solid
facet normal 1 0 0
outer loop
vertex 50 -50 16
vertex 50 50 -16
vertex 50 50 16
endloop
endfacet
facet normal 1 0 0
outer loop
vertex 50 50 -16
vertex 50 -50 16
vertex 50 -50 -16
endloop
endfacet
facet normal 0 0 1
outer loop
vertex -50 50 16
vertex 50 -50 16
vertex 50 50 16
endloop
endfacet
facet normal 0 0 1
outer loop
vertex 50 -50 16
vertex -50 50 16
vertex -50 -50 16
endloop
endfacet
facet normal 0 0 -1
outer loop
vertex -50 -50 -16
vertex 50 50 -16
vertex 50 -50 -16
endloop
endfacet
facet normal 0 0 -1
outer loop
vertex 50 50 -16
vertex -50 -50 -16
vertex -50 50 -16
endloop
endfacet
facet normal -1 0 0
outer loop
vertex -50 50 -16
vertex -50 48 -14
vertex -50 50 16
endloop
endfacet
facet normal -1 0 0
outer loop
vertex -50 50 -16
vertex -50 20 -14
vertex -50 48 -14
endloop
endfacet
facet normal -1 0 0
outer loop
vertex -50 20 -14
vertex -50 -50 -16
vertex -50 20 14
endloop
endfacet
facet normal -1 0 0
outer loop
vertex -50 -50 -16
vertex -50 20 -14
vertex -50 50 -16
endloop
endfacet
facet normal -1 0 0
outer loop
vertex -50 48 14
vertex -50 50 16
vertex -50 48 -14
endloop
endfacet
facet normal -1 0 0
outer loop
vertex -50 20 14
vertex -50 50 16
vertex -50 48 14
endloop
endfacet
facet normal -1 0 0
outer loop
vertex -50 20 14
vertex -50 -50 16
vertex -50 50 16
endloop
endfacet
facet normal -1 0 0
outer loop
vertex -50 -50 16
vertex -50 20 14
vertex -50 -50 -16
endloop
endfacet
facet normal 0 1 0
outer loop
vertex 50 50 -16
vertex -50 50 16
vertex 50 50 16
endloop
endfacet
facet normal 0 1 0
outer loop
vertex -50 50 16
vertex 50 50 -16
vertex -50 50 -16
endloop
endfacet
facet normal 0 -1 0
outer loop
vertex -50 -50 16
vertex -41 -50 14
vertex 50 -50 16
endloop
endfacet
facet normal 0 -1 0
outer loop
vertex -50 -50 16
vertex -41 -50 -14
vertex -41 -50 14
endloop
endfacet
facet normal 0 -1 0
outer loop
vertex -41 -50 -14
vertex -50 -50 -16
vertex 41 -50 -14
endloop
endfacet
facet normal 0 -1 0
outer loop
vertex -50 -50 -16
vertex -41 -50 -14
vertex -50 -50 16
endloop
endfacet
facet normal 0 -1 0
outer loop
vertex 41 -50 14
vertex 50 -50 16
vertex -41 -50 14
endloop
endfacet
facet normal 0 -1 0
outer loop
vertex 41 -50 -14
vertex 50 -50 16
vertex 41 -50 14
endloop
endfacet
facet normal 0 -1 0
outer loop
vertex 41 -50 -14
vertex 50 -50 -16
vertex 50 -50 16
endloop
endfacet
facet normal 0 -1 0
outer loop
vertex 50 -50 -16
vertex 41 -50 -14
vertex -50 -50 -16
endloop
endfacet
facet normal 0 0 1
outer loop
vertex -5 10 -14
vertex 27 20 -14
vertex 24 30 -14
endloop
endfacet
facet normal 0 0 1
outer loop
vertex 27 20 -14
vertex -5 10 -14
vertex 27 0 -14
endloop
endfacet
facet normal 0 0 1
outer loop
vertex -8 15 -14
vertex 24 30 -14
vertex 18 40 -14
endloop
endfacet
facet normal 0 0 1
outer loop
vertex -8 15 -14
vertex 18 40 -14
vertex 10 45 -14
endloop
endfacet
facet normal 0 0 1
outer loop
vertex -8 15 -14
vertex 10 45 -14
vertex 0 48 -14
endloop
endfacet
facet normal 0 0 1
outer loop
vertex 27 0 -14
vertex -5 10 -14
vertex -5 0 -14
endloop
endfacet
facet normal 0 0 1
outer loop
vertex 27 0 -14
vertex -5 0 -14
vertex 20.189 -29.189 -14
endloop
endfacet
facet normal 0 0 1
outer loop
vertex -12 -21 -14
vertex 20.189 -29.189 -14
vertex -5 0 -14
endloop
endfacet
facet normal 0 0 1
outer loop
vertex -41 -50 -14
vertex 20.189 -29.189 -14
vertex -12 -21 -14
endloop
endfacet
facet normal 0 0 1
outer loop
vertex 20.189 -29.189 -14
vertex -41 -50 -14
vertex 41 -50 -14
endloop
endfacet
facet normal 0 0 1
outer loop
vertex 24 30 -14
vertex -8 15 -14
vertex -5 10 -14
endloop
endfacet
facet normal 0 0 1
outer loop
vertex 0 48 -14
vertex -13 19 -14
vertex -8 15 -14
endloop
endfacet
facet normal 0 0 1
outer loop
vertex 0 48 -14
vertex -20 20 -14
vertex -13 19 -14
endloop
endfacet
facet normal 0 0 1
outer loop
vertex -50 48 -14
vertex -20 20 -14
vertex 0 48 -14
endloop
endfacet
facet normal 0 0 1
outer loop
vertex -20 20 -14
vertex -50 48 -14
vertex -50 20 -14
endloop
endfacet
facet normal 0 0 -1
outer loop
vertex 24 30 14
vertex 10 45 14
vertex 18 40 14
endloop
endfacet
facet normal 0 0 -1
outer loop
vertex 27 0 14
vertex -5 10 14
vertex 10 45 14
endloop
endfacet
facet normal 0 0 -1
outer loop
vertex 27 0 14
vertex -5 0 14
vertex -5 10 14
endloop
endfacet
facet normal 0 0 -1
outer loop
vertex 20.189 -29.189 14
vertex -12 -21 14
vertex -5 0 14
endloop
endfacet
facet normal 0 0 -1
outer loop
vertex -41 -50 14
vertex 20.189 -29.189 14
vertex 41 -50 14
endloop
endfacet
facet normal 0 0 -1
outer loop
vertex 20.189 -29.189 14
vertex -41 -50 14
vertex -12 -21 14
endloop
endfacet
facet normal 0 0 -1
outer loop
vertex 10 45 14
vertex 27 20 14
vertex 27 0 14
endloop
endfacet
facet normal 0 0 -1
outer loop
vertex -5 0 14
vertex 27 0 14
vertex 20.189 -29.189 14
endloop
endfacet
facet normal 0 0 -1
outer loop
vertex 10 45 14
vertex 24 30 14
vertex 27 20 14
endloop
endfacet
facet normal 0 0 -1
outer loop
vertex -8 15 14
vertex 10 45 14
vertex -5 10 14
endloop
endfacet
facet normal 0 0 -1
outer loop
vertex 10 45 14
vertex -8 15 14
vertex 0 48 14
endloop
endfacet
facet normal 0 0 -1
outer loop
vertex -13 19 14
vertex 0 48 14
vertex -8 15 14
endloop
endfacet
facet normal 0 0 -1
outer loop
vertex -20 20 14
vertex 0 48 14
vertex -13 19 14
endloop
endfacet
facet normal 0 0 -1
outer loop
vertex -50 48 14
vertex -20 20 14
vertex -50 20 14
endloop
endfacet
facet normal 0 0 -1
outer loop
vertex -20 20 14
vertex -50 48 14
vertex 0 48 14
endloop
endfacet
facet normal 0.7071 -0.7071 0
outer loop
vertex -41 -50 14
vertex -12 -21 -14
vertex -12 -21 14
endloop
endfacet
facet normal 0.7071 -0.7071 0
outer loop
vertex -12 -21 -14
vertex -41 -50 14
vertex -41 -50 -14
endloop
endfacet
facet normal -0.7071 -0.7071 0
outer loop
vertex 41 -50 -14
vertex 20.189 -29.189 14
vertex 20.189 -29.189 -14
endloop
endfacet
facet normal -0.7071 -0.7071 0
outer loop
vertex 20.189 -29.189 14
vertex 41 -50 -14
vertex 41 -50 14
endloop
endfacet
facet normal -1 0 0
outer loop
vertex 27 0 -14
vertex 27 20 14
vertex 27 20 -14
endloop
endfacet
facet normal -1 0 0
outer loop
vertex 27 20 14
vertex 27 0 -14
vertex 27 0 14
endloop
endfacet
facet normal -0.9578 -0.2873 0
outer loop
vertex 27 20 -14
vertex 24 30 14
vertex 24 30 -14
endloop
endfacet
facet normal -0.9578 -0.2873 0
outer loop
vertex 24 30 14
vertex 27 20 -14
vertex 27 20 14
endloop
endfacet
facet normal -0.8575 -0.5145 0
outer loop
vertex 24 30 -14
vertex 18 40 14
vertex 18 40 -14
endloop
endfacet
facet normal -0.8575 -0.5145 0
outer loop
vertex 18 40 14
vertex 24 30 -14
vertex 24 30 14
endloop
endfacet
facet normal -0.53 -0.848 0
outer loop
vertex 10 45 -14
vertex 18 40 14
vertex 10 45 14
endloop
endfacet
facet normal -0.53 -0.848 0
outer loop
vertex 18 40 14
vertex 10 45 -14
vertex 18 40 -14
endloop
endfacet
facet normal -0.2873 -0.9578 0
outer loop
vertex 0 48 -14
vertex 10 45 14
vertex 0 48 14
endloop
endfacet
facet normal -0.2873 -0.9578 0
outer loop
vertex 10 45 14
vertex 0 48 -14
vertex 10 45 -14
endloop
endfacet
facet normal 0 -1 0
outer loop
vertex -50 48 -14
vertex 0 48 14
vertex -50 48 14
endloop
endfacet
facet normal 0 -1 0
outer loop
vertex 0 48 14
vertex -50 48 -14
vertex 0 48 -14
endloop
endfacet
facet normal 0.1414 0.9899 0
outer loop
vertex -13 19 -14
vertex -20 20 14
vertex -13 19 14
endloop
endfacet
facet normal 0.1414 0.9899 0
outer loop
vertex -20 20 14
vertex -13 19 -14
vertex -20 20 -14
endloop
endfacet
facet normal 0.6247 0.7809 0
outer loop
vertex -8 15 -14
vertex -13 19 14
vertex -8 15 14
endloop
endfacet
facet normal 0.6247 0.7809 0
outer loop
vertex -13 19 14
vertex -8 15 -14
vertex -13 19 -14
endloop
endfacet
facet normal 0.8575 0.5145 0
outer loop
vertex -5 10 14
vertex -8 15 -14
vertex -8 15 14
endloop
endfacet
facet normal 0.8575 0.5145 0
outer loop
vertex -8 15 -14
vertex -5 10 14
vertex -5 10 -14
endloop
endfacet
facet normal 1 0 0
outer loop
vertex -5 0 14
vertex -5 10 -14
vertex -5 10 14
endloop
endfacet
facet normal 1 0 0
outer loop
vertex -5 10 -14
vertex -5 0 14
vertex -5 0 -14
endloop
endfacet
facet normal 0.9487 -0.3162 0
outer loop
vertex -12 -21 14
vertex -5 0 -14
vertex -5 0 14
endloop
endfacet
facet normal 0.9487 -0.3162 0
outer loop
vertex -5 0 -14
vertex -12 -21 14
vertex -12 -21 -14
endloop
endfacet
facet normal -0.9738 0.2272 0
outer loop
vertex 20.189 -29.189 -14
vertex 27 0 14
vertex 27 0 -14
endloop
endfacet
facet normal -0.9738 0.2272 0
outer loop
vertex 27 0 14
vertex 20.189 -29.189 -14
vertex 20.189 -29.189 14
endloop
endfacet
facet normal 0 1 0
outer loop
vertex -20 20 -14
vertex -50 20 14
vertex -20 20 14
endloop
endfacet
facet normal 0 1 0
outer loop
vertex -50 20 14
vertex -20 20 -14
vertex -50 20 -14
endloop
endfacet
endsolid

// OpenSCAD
$fa = 1;
$fs = 0.4;
//width = 60;
//cube([width,width,3],center=true);
//translate([0,0,30])
//    cube([60,60,3],center=true);

$fn=60;

radius = 2;
dimX = 100;
dimY = 100;
dimZ = 32;
cornerX = (dimX/2-radius);
cornerY = (dimY/2-radius);
cornerZ = (dimZ/2-radius);
dimZInt = (dimZ-radius*2);
    
module drawRoundedBox()
{
    
    hull() {
        translate([cornerX,cornerY,cornerZ])
            sphere(radius);
        translate([cornerX,-cornerY,-cornerZ])
            sphere(radius);
        translate([-cornerX,cornerY,-cornerZ])
            sphere(radius);
        translate([-cornerX,-cornerY,cornerZ])
            sphere(radius);
        translate([cornerX,cornerY,-cornerZ])
            sphere(radius);
        translate([cornerX,-cornerY,cornerZ])
            sphere(radius);
        translate([-cornerX,cornerY,cornerZ])
            sphere(radius);
        translate([-cornerX,-cornerY,-cornerZ])
            sphere(radius);
    }

}

difference() {
    
    //color(alpha = 0.5)render()
    //drawRoundedBox();
    cube([dimX, dimY, dimZ], center=true);
    
    //translate([0, -20, 0])
        //cube(dimZInt, center=true);

    // entry triangle
    linear_extrude(dimZInt, center=true)
        translate([0,-9,0])
        rotate(-135)
        polygon([[0,0], [60,0], [0,60]]);
    
    // bottom inverted triangle
    linear_extrude(dimZInt, center=true)
        translate([0,0,0])
        polygon([[-15,-30], 
                 [20,-30], 
                 [27,0], 
                 [27,20], 
                 [24,30],
                 [18,40],
                 [10,45],
                 [0,48],
                 [-10,48],
                 [-20,20],
                 [-13,19],
                 [-8,15],
                 [-5,10],
                 [-5,0]
        ]);
    
    // down tube
    //translate([15, -5, 0])
    //    rotate(70)
    //    cube([50, 40, dimZInt], center=true);
    
    // exit tube
    translate([-36, 34, 0])
        cube([52, dimZInt, dimZInt], center=true);
}
